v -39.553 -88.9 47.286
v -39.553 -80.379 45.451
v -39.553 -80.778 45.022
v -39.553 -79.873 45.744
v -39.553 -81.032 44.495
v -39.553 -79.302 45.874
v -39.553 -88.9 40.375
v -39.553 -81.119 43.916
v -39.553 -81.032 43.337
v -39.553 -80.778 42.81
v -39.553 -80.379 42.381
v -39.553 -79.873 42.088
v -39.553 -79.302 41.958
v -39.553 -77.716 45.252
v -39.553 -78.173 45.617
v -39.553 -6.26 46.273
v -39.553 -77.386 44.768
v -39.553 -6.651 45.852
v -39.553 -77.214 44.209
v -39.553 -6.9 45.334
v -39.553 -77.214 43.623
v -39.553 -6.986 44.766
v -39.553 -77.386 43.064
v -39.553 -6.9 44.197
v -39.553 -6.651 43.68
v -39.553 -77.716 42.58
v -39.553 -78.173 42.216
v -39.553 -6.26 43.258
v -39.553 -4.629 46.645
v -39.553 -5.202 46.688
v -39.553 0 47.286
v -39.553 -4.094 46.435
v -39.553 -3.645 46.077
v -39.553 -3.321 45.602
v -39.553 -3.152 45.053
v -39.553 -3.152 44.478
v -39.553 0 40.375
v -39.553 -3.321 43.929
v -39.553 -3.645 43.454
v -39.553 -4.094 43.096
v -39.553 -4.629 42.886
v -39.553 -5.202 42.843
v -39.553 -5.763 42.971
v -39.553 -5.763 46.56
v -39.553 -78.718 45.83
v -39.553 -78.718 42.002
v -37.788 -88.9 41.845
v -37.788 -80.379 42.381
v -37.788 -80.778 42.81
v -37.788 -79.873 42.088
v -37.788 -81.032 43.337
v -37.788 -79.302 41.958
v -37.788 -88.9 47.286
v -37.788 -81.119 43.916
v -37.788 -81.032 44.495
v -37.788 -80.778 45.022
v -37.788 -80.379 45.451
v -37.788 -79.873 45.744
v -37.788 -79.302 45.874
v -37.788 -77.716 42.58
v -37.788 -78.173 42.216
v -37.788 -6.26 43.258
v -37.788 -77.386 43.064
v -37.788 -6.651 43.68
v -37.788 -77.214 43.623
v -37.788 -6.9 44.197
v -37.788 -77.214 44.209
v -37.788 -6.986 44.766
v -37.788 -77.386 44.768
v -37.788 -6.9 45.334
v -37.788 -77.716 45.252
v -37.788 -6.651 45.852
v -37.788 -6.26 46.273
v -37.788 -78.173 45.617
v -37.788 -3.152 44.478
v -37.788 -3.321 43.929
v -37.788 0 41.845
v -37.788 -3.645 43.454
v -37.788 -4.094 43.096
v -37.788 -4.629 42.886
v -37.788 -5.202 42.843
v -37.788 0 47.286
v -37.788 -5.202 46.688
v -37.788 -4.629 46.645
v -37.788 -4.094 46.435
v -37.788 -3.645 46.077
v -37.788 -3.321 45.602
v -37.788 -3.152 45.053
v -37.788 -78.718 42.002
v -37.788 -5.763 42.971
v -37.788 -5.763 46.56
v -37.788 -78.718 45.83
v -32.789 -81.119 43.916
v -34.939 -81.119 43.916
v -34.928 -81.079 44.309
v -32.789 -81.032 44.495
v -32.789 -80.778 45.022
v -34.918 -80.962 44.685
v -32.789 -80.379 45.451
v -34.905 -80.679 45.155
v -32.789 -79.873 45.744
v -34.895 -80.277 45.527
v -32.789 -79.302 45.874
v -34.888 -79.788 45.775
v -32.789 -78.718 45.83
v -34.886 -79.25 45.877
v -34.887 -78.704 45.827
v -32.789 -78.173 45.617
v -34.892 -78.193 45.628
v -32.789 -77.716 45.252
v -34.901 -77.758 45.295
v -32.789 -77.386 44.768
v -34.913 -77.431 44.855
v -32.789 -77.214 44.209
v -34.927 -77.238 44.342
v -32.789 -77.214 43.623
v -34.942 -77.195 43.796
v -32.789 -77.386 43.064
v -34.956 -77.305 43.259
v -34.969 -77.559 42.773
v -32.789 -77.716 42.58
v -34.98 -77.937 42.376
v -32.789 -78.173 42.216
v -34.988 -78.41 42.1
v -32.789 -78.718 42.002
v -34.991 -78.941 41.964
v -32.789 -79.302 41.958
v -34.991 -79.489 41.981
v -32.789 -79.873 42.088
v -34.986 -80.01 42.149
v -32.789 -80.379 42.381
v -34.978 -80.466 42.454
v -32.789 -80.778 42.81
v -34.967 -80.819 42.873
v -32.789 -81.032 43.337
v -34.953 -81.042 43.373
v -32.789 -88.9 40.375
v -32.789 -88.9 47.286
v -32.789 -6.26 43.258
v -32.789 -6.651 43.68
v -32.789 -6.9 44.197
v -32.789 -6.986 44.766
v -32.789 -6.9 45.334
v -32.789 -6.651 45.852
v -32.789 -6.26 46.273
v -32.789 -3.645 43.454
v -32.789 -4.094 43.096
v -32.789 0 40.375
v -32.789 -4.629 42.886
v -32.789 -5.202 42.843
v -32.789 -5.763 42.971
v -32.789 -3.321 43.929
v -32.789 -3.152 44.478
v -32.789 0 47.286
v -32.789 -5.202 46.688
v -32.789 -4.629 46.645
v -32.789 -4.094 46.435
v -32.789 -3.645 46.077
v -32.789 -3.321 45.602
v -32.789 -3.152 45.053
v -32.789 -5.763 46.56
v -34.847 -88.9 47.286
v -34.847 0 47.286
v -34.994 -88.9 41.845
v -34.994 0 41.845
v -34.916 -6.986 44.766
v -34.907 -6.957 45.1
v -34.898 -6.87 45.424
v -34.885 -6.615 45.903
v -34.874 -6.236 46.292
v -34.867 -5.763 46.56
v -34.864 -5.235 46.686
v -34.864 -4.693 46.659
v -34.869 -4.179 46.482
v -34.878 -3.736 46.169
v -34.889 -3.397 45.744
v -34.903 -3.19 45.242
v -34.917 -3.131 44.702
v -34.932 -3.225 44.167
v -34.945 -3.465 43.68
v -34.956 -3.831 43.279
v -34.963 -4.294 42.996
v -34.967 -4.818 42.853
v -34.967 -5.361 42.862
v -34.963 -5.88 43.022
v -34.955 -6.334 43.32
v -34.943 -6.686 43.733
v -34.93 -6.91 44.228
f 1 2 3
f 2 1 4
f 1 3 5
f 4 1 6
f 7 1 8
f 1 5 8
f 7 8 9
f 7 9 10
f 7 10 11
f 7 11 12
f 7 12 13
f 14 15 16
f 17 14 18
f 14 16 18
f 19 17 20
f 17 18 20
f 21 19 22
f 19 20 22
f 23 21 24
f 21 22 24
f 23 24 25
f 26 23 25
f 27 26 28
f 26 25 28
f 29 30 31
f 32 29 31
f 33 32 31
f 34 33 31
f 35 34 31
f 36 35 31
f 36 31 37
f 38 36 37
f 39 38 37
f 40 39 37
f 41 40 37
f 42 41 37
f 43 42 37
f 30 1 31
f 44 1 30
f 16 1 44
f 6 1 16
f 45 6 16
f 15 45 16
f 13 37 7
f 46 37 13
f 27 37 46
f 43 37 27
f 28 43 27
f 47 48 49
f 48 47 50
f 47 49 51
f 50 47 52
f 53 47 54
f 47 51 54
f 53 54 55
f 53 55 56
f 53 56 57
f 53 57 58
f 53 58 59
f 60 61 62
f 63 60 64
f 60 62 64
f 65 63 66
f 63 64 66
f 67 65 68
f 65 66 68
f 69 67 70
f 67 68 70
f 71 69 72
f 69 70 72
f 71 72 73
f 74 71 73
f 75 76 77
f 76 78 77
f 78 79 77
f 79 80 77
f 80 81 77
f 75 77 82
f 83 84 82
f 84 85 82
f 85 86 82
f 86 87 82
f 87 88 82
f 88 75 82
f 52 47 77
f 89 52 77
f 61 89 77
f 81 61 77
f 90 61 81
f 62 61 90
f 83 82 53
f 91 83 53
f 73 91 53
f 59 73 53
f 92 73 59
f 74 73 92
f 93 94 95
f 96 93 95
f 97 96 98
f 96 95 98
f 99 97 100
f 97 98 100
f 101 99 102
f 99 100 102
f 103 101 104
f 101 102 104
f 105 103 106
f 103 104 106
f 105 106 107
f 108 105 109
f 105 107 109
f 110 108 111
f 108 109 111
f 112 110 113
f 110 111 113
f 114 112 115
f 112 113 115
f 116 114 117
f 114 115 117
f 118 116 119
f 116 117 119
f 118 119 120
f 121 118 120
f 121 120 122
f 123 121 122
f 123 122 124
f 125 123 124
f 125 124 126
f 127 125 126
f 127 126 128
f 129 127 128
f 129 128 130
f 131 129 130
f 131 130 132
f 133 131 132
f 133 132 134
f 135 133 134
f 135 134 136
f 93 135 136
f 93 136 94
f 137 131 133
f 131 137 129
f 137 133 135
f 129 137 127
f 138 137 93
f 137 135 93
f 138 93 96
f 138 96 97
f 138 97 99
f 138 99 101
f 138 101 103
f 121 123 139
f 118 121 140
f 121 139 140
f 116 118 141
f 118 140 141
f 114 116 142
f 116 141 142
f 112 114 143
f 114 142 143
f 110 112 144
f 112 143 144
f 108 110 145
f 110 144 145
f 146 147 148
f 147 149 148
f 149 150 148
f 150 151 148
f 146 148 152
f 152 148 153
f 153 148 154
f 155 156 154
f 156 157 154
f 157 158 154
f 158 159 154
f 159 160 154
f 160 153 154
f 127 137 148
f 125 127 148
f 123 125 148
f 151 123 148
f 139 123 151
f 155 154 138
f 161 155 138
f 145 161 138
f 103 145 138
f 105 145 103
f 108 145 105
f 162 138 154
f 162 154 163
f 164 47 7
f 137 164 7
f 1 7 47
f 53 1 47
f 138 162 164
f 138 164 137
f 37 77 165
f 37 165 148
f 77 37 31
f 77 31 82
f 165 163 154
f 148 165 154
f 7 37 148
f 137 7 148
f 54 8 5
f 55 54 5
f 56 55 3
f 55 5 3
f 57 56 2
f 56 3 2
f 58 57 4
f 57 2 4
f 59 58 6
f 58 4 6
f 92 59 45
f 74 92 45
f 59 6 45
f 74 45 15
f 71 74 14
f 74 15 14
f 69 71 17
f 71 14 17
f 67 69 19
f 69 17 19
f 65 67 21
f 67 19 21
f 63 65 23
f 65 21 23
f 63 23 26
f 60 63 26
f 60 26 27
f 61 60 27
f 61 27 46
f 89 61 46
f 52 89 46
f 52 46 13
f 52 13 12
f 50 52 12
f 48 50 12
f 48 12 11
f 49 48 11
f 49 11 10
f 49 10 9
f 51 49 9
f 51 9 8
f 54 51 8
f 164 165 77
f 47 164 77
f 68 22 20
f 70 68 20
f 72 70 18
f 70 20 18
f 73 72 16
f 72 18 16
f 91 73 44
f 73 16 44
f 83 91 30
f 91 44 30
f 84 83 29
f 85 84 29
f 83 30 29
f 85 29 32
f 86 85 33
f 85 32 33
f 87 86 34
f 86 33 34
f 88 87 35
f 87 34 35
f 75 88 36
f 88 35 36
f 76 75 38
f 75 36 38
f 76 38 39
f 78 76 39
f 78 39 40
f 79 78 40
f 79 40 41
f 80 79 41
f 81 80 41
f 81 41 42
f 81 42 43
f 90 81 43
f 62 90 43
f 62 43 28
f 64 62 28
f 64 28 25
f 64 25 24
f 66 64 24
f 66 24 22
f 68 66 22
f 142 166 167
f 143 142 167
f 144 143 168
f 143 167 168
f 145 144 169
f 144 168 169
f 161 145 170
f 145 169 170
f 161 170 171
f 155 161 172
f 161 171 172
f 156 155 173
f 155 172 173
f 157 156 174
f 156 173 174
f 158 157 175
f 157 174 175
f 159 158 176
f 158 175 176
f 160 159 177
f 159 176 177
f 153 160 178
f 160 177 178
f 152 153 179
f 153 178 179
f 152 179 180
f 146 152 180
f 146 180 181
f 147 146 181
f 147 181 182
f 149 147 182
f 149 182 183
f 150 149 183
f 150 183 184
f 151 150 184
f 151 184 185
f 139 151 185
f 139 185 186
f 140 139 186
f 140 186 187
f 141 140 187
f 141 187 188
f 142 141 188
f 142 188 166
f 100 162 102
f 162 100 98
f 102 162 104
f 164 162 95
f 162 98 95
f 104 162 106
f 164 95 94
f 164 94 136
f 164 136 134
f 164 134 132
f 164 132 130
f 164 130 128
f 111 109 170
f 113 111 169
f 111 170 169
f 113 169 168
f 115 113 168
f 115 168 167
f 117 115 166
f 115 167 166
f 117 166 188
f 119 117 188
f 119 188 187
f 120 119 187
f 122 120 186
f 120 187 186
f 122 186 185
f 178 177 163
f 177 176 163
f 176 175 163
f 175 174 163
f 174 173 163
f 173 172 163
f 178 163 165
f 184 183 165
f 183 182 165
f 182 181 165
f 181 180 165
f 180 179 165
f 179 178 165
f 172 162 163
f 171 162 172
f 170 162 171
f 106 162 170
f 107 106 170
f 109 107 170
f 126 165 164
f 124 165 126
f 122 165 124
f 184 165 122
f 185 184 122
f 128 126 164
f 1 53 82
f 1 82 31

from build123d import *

# Parameters (mm, degrees)
F1_DEPTH = 88.9
F2_R     = 1.92798
F3_DEPTH = 25.4
F4_R     = 1.963554
F5_DEPTH = 25.4


with BuildPart() as f1:
    # F0 (on Front) → F1 (new body)
    with BuildSketch(Plane.XZ):
        Polygon((-37.788483, 47.28636), (-39.553114, 47.28636), (-39.553114, 40.374884), (-36.170904, 40.374884), (-32.788693, 40.374884), (-32.788693, 47.28636), (-34.84743, 47.28636), (-34.994483, 41.84541), (-37.788483, 41.84541), align=None)
    extrude(amount=F1_DEPTH)

    # F2 (on face) → F3 (cut)
    with BuildSketch(Plane(origin=(-39.553114, 0, 0), x_dir=(0, -1, 0), z_dir=(-1, 0, 0))):
        with Locations((5.058136, 44.765752)):
            Circle(F2_R)
    extrude(amount=-F3_DEPTH, mode=Mode.SUBTRACT)

    # F4 (on face) → F5 (cut)
    with BuildSketch(Plane(origin=(-39.553114, 0, 0), x_dir=(0, -1, 0), z_dir=(-1, 0, 0))):
        with Locations((79.155207, 43.916043)):
            Circle(F4_R)
    extrude(amount=-F5_DEPTH, mode=Mode.SUBTRACT)


solid = f1.part
